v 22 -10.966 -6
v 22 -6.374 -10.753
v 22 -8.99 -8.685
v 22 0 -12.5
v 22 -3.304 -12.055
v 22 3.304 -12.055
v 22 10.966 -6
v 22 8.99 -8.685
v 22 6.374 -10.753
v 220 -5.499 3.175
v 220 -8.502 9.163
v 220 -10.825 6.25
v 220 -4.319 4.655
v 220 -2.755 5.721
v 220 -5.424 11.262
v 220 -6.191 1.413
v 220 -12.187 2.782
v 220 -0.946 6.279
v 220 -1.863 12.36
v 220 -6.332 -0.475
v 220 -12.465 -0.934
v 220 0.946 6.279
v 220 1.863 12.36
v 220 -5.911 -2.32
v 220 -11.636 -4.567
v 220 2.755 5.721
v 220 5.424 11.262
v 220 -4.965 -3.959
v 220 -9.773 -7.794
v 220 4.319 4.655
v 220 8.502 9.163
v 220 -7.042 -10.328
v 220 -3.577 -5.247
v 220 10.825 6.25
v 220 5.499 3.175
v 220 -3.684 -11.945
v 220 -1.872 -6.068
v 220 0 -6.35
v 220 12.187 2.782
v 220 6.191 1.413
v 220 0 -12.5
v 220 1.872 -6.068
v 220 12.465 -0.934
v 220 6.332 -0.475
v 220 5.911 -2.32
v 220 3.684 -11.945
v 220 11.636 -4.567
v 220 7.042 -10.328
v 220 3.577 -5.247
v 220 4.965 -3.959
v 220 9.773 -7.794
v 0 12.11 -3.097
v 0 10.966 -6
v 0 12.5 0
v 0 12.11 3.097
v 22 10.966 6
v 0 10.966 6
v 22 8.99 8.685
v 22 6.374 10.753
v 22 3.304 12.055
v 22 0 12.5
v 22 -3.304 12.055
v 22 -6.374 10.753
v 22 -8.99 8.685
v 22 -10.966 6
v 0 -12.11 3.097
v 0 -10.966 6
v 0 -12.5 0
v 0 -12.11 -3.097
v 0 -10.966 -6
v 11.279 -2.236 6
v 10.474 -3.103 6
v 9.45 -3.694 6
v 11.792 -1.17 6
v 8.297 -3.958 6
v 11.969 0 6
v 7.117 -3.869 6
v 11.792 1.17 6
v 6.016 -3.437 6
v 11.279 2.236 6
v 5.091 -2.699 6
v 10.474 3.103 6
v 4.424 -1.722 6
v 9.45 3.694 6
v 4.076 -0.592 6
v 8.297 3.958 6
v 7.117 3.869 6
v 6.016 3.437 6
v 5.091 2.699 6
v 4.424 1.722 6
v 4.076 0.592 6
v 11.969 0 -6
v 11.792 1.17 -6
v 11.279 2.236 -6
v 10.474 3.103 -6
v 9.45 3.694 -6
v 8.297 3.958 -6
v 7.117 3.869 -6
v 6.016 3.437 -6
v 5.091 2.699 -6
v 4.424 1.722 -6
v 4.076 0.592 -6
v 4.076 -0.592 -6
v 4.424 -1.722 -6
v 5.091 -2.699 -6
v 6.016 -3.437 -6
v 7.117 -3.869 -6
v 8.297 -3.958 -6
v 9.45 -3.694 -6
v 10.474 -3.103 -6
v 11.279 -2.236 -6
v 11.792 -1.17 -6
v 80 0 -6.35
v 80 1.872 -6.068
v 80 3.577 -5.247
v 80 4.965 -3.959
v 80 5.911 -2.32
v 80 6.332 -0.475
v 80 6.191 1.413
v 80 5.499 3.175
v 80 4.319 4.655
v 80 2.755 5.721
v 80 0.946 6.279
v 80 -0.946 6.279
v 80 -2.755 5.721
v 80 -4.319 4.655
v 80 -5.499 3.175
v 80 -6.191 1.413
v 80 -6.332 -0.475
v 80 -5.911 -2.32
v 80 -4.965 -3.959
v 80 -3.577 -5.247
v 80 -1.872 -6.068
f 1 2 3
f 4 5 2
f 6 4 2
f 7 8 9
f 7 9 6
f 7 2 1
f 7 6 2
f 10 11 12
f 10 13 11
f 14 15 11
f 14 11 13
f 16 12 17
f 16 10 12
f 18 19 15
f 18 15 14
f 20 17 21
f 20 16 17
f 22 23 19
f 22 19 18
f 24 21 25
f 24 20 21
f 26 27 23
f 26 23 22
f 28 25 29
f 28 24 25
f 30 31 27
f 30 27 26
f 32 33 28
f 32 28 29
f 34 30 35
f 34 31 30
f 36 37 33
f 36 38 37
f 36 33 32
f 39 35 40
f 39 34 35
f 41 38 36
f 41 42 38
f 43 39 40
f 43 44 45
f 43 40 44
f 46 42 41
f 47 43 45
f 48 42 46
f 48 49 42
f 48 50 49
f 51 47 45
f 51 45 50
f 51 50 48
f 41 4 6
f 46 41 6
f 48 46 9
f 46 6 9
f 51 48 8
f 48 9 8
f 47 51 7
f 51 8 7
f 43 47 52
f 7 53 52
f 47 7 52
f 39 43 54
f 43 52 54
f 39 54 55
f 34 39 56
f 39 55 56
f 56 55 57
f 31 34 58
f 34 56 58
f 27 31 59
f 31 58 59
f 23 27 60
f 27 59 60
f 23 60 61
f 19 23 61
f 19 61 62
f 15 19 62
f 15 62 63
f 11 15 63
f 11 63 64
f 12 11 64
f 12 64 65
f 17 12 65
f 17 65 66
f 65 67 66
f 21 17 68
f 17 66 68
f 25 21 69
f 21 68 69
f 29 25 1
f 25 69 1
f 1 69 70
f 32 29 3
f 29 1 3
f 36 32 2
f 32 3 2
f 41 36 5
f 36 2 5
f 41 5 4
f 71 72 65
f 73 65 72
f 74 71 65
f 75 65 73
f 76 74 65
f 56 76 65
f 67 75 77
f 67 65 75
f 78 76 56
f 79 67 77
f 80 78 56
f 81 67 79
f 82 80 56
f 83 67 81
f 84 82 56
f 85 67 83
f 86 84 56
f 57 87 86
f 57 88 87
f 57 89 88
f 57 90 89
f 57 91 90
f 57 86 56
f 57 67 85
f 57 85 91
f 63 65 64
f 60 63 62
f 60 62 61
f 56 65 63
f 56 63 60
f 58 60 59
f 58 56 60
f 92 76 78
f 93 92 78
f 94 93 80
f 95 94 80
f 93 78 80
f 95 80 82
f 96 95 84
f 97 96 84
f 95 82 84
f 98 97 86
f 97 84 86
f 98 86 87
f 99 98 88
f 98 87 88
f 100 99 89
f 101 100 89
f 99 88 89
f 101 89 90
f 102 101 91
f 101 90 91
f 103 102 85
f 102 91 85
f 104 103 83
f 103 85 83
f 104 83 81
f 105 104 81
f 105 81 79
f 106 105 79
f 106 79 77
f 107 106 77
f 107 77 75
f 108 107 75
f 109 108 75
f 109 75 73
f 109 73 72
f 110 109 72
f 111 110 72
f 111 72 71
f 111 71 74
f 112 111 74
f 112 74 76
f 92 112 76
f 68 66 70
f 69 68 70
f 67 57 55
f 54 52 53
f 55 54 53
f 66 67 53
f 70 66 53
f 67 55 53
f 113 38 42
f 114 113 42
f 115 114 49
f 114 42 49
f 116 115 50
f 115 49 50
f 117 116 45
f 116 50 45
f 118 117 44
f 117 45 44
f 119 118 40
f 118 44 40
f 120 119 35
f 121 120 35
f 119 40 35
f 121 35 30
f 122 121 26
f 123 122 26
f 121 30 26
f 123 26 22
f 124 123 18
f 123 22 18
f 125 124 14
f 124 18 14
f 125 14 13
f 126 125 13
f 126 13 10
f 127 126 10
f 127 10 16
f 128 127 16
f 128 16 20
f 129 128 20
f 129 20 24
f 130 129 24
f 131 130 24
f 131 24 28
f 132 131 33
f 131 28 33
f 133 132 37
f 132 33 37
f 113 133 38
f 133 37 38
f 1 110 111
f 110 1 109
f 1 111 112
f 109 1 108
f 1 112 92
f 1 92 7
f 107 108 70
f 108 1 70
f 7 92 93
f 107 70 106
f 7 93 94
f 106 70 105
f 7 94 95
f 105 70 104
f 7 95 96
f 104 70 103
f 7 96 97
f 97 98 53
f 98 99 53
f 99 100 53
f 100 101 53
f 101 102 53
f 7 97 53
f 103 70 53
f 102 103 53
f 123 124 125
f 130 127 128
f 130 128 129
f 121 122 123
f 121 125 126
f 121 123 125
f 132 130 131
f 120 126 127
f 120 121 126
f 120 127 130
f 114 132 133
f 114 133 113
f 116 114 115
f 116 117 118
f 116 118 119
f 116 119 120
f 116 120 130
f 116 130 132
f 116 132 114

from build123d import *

# Parameters (mm, degrees)
CROQUIS1_R              = 12.5
SALIENTE_EXTRUIR1_DEPTH = 220
CROQUIS2_W              = 7.84246484
CROQUIS2_H              = 28.503577792
CROQUIS2_W_2            = 7.563798576
CROQUIS2_H_2            = 29.299767116
CORTAR_EXTRUIR1_DEPTH   = 22
CROQUIS3_R              = 3.96875
CORTAR_EXTRUIR2_DEPTH   = 22
CROQUIS4_R              = 6.35
CORTAR_EXTRUIR3_DEPTH   = 140


with BuildPart() as part:
    # Croquis1 → Saliente-Extruir1 (new body)
    with BuildSketch(Plane(origin=(0, 0, 0), x_dir=(0, 0, -1), z_dir=(1, 0, 0))):
        Circle(CROQUIS1_R)
    extrude(amount=SALIENTE_EXTRUIR1_DEPTH)

    # Croquis2 → Cortar-Extruir1 (cut)
    with BuildSketch(Plane.ZY):
        with Locations((-9.92123242, 0.389210904)):
            Rectangle(CROQUIS2_W, CROQUIS2_H)
        with Locations((9.781899288, 0.787305566)):
            Rectangle(CROQUIS2_W_2, CROQUIS2_H_2)
    extrude(amount=-CORTAR_EXTRUIR1_DEPTH, mode=Mode.SUBTRACT)

    # Croquis3 → Cortar-Extruir2 (cut)
    with BuildSketch(Plane.XY.offset(6)):
        with Locations((8, 0)):
            Circle(CROQUIS3_R)
    extrude(amount=-CORTAR_EXTRUIR2_DEPTH, mode=Mode.SUBTRACT)

    # Croquis4 → Cortar-Extruir3 (cut)
    with BuildSketch(Plane(origin=(220, 0, 0), x_dir=(0, 0, -1), z_dir=(1, 0, 0))):
        Circle(CROQUIS4_R)
    extrude(amount=-CORTAR_EXTRUIR3_DEPTH, mode=Mode.SUBTRACT)


solid = part.part
